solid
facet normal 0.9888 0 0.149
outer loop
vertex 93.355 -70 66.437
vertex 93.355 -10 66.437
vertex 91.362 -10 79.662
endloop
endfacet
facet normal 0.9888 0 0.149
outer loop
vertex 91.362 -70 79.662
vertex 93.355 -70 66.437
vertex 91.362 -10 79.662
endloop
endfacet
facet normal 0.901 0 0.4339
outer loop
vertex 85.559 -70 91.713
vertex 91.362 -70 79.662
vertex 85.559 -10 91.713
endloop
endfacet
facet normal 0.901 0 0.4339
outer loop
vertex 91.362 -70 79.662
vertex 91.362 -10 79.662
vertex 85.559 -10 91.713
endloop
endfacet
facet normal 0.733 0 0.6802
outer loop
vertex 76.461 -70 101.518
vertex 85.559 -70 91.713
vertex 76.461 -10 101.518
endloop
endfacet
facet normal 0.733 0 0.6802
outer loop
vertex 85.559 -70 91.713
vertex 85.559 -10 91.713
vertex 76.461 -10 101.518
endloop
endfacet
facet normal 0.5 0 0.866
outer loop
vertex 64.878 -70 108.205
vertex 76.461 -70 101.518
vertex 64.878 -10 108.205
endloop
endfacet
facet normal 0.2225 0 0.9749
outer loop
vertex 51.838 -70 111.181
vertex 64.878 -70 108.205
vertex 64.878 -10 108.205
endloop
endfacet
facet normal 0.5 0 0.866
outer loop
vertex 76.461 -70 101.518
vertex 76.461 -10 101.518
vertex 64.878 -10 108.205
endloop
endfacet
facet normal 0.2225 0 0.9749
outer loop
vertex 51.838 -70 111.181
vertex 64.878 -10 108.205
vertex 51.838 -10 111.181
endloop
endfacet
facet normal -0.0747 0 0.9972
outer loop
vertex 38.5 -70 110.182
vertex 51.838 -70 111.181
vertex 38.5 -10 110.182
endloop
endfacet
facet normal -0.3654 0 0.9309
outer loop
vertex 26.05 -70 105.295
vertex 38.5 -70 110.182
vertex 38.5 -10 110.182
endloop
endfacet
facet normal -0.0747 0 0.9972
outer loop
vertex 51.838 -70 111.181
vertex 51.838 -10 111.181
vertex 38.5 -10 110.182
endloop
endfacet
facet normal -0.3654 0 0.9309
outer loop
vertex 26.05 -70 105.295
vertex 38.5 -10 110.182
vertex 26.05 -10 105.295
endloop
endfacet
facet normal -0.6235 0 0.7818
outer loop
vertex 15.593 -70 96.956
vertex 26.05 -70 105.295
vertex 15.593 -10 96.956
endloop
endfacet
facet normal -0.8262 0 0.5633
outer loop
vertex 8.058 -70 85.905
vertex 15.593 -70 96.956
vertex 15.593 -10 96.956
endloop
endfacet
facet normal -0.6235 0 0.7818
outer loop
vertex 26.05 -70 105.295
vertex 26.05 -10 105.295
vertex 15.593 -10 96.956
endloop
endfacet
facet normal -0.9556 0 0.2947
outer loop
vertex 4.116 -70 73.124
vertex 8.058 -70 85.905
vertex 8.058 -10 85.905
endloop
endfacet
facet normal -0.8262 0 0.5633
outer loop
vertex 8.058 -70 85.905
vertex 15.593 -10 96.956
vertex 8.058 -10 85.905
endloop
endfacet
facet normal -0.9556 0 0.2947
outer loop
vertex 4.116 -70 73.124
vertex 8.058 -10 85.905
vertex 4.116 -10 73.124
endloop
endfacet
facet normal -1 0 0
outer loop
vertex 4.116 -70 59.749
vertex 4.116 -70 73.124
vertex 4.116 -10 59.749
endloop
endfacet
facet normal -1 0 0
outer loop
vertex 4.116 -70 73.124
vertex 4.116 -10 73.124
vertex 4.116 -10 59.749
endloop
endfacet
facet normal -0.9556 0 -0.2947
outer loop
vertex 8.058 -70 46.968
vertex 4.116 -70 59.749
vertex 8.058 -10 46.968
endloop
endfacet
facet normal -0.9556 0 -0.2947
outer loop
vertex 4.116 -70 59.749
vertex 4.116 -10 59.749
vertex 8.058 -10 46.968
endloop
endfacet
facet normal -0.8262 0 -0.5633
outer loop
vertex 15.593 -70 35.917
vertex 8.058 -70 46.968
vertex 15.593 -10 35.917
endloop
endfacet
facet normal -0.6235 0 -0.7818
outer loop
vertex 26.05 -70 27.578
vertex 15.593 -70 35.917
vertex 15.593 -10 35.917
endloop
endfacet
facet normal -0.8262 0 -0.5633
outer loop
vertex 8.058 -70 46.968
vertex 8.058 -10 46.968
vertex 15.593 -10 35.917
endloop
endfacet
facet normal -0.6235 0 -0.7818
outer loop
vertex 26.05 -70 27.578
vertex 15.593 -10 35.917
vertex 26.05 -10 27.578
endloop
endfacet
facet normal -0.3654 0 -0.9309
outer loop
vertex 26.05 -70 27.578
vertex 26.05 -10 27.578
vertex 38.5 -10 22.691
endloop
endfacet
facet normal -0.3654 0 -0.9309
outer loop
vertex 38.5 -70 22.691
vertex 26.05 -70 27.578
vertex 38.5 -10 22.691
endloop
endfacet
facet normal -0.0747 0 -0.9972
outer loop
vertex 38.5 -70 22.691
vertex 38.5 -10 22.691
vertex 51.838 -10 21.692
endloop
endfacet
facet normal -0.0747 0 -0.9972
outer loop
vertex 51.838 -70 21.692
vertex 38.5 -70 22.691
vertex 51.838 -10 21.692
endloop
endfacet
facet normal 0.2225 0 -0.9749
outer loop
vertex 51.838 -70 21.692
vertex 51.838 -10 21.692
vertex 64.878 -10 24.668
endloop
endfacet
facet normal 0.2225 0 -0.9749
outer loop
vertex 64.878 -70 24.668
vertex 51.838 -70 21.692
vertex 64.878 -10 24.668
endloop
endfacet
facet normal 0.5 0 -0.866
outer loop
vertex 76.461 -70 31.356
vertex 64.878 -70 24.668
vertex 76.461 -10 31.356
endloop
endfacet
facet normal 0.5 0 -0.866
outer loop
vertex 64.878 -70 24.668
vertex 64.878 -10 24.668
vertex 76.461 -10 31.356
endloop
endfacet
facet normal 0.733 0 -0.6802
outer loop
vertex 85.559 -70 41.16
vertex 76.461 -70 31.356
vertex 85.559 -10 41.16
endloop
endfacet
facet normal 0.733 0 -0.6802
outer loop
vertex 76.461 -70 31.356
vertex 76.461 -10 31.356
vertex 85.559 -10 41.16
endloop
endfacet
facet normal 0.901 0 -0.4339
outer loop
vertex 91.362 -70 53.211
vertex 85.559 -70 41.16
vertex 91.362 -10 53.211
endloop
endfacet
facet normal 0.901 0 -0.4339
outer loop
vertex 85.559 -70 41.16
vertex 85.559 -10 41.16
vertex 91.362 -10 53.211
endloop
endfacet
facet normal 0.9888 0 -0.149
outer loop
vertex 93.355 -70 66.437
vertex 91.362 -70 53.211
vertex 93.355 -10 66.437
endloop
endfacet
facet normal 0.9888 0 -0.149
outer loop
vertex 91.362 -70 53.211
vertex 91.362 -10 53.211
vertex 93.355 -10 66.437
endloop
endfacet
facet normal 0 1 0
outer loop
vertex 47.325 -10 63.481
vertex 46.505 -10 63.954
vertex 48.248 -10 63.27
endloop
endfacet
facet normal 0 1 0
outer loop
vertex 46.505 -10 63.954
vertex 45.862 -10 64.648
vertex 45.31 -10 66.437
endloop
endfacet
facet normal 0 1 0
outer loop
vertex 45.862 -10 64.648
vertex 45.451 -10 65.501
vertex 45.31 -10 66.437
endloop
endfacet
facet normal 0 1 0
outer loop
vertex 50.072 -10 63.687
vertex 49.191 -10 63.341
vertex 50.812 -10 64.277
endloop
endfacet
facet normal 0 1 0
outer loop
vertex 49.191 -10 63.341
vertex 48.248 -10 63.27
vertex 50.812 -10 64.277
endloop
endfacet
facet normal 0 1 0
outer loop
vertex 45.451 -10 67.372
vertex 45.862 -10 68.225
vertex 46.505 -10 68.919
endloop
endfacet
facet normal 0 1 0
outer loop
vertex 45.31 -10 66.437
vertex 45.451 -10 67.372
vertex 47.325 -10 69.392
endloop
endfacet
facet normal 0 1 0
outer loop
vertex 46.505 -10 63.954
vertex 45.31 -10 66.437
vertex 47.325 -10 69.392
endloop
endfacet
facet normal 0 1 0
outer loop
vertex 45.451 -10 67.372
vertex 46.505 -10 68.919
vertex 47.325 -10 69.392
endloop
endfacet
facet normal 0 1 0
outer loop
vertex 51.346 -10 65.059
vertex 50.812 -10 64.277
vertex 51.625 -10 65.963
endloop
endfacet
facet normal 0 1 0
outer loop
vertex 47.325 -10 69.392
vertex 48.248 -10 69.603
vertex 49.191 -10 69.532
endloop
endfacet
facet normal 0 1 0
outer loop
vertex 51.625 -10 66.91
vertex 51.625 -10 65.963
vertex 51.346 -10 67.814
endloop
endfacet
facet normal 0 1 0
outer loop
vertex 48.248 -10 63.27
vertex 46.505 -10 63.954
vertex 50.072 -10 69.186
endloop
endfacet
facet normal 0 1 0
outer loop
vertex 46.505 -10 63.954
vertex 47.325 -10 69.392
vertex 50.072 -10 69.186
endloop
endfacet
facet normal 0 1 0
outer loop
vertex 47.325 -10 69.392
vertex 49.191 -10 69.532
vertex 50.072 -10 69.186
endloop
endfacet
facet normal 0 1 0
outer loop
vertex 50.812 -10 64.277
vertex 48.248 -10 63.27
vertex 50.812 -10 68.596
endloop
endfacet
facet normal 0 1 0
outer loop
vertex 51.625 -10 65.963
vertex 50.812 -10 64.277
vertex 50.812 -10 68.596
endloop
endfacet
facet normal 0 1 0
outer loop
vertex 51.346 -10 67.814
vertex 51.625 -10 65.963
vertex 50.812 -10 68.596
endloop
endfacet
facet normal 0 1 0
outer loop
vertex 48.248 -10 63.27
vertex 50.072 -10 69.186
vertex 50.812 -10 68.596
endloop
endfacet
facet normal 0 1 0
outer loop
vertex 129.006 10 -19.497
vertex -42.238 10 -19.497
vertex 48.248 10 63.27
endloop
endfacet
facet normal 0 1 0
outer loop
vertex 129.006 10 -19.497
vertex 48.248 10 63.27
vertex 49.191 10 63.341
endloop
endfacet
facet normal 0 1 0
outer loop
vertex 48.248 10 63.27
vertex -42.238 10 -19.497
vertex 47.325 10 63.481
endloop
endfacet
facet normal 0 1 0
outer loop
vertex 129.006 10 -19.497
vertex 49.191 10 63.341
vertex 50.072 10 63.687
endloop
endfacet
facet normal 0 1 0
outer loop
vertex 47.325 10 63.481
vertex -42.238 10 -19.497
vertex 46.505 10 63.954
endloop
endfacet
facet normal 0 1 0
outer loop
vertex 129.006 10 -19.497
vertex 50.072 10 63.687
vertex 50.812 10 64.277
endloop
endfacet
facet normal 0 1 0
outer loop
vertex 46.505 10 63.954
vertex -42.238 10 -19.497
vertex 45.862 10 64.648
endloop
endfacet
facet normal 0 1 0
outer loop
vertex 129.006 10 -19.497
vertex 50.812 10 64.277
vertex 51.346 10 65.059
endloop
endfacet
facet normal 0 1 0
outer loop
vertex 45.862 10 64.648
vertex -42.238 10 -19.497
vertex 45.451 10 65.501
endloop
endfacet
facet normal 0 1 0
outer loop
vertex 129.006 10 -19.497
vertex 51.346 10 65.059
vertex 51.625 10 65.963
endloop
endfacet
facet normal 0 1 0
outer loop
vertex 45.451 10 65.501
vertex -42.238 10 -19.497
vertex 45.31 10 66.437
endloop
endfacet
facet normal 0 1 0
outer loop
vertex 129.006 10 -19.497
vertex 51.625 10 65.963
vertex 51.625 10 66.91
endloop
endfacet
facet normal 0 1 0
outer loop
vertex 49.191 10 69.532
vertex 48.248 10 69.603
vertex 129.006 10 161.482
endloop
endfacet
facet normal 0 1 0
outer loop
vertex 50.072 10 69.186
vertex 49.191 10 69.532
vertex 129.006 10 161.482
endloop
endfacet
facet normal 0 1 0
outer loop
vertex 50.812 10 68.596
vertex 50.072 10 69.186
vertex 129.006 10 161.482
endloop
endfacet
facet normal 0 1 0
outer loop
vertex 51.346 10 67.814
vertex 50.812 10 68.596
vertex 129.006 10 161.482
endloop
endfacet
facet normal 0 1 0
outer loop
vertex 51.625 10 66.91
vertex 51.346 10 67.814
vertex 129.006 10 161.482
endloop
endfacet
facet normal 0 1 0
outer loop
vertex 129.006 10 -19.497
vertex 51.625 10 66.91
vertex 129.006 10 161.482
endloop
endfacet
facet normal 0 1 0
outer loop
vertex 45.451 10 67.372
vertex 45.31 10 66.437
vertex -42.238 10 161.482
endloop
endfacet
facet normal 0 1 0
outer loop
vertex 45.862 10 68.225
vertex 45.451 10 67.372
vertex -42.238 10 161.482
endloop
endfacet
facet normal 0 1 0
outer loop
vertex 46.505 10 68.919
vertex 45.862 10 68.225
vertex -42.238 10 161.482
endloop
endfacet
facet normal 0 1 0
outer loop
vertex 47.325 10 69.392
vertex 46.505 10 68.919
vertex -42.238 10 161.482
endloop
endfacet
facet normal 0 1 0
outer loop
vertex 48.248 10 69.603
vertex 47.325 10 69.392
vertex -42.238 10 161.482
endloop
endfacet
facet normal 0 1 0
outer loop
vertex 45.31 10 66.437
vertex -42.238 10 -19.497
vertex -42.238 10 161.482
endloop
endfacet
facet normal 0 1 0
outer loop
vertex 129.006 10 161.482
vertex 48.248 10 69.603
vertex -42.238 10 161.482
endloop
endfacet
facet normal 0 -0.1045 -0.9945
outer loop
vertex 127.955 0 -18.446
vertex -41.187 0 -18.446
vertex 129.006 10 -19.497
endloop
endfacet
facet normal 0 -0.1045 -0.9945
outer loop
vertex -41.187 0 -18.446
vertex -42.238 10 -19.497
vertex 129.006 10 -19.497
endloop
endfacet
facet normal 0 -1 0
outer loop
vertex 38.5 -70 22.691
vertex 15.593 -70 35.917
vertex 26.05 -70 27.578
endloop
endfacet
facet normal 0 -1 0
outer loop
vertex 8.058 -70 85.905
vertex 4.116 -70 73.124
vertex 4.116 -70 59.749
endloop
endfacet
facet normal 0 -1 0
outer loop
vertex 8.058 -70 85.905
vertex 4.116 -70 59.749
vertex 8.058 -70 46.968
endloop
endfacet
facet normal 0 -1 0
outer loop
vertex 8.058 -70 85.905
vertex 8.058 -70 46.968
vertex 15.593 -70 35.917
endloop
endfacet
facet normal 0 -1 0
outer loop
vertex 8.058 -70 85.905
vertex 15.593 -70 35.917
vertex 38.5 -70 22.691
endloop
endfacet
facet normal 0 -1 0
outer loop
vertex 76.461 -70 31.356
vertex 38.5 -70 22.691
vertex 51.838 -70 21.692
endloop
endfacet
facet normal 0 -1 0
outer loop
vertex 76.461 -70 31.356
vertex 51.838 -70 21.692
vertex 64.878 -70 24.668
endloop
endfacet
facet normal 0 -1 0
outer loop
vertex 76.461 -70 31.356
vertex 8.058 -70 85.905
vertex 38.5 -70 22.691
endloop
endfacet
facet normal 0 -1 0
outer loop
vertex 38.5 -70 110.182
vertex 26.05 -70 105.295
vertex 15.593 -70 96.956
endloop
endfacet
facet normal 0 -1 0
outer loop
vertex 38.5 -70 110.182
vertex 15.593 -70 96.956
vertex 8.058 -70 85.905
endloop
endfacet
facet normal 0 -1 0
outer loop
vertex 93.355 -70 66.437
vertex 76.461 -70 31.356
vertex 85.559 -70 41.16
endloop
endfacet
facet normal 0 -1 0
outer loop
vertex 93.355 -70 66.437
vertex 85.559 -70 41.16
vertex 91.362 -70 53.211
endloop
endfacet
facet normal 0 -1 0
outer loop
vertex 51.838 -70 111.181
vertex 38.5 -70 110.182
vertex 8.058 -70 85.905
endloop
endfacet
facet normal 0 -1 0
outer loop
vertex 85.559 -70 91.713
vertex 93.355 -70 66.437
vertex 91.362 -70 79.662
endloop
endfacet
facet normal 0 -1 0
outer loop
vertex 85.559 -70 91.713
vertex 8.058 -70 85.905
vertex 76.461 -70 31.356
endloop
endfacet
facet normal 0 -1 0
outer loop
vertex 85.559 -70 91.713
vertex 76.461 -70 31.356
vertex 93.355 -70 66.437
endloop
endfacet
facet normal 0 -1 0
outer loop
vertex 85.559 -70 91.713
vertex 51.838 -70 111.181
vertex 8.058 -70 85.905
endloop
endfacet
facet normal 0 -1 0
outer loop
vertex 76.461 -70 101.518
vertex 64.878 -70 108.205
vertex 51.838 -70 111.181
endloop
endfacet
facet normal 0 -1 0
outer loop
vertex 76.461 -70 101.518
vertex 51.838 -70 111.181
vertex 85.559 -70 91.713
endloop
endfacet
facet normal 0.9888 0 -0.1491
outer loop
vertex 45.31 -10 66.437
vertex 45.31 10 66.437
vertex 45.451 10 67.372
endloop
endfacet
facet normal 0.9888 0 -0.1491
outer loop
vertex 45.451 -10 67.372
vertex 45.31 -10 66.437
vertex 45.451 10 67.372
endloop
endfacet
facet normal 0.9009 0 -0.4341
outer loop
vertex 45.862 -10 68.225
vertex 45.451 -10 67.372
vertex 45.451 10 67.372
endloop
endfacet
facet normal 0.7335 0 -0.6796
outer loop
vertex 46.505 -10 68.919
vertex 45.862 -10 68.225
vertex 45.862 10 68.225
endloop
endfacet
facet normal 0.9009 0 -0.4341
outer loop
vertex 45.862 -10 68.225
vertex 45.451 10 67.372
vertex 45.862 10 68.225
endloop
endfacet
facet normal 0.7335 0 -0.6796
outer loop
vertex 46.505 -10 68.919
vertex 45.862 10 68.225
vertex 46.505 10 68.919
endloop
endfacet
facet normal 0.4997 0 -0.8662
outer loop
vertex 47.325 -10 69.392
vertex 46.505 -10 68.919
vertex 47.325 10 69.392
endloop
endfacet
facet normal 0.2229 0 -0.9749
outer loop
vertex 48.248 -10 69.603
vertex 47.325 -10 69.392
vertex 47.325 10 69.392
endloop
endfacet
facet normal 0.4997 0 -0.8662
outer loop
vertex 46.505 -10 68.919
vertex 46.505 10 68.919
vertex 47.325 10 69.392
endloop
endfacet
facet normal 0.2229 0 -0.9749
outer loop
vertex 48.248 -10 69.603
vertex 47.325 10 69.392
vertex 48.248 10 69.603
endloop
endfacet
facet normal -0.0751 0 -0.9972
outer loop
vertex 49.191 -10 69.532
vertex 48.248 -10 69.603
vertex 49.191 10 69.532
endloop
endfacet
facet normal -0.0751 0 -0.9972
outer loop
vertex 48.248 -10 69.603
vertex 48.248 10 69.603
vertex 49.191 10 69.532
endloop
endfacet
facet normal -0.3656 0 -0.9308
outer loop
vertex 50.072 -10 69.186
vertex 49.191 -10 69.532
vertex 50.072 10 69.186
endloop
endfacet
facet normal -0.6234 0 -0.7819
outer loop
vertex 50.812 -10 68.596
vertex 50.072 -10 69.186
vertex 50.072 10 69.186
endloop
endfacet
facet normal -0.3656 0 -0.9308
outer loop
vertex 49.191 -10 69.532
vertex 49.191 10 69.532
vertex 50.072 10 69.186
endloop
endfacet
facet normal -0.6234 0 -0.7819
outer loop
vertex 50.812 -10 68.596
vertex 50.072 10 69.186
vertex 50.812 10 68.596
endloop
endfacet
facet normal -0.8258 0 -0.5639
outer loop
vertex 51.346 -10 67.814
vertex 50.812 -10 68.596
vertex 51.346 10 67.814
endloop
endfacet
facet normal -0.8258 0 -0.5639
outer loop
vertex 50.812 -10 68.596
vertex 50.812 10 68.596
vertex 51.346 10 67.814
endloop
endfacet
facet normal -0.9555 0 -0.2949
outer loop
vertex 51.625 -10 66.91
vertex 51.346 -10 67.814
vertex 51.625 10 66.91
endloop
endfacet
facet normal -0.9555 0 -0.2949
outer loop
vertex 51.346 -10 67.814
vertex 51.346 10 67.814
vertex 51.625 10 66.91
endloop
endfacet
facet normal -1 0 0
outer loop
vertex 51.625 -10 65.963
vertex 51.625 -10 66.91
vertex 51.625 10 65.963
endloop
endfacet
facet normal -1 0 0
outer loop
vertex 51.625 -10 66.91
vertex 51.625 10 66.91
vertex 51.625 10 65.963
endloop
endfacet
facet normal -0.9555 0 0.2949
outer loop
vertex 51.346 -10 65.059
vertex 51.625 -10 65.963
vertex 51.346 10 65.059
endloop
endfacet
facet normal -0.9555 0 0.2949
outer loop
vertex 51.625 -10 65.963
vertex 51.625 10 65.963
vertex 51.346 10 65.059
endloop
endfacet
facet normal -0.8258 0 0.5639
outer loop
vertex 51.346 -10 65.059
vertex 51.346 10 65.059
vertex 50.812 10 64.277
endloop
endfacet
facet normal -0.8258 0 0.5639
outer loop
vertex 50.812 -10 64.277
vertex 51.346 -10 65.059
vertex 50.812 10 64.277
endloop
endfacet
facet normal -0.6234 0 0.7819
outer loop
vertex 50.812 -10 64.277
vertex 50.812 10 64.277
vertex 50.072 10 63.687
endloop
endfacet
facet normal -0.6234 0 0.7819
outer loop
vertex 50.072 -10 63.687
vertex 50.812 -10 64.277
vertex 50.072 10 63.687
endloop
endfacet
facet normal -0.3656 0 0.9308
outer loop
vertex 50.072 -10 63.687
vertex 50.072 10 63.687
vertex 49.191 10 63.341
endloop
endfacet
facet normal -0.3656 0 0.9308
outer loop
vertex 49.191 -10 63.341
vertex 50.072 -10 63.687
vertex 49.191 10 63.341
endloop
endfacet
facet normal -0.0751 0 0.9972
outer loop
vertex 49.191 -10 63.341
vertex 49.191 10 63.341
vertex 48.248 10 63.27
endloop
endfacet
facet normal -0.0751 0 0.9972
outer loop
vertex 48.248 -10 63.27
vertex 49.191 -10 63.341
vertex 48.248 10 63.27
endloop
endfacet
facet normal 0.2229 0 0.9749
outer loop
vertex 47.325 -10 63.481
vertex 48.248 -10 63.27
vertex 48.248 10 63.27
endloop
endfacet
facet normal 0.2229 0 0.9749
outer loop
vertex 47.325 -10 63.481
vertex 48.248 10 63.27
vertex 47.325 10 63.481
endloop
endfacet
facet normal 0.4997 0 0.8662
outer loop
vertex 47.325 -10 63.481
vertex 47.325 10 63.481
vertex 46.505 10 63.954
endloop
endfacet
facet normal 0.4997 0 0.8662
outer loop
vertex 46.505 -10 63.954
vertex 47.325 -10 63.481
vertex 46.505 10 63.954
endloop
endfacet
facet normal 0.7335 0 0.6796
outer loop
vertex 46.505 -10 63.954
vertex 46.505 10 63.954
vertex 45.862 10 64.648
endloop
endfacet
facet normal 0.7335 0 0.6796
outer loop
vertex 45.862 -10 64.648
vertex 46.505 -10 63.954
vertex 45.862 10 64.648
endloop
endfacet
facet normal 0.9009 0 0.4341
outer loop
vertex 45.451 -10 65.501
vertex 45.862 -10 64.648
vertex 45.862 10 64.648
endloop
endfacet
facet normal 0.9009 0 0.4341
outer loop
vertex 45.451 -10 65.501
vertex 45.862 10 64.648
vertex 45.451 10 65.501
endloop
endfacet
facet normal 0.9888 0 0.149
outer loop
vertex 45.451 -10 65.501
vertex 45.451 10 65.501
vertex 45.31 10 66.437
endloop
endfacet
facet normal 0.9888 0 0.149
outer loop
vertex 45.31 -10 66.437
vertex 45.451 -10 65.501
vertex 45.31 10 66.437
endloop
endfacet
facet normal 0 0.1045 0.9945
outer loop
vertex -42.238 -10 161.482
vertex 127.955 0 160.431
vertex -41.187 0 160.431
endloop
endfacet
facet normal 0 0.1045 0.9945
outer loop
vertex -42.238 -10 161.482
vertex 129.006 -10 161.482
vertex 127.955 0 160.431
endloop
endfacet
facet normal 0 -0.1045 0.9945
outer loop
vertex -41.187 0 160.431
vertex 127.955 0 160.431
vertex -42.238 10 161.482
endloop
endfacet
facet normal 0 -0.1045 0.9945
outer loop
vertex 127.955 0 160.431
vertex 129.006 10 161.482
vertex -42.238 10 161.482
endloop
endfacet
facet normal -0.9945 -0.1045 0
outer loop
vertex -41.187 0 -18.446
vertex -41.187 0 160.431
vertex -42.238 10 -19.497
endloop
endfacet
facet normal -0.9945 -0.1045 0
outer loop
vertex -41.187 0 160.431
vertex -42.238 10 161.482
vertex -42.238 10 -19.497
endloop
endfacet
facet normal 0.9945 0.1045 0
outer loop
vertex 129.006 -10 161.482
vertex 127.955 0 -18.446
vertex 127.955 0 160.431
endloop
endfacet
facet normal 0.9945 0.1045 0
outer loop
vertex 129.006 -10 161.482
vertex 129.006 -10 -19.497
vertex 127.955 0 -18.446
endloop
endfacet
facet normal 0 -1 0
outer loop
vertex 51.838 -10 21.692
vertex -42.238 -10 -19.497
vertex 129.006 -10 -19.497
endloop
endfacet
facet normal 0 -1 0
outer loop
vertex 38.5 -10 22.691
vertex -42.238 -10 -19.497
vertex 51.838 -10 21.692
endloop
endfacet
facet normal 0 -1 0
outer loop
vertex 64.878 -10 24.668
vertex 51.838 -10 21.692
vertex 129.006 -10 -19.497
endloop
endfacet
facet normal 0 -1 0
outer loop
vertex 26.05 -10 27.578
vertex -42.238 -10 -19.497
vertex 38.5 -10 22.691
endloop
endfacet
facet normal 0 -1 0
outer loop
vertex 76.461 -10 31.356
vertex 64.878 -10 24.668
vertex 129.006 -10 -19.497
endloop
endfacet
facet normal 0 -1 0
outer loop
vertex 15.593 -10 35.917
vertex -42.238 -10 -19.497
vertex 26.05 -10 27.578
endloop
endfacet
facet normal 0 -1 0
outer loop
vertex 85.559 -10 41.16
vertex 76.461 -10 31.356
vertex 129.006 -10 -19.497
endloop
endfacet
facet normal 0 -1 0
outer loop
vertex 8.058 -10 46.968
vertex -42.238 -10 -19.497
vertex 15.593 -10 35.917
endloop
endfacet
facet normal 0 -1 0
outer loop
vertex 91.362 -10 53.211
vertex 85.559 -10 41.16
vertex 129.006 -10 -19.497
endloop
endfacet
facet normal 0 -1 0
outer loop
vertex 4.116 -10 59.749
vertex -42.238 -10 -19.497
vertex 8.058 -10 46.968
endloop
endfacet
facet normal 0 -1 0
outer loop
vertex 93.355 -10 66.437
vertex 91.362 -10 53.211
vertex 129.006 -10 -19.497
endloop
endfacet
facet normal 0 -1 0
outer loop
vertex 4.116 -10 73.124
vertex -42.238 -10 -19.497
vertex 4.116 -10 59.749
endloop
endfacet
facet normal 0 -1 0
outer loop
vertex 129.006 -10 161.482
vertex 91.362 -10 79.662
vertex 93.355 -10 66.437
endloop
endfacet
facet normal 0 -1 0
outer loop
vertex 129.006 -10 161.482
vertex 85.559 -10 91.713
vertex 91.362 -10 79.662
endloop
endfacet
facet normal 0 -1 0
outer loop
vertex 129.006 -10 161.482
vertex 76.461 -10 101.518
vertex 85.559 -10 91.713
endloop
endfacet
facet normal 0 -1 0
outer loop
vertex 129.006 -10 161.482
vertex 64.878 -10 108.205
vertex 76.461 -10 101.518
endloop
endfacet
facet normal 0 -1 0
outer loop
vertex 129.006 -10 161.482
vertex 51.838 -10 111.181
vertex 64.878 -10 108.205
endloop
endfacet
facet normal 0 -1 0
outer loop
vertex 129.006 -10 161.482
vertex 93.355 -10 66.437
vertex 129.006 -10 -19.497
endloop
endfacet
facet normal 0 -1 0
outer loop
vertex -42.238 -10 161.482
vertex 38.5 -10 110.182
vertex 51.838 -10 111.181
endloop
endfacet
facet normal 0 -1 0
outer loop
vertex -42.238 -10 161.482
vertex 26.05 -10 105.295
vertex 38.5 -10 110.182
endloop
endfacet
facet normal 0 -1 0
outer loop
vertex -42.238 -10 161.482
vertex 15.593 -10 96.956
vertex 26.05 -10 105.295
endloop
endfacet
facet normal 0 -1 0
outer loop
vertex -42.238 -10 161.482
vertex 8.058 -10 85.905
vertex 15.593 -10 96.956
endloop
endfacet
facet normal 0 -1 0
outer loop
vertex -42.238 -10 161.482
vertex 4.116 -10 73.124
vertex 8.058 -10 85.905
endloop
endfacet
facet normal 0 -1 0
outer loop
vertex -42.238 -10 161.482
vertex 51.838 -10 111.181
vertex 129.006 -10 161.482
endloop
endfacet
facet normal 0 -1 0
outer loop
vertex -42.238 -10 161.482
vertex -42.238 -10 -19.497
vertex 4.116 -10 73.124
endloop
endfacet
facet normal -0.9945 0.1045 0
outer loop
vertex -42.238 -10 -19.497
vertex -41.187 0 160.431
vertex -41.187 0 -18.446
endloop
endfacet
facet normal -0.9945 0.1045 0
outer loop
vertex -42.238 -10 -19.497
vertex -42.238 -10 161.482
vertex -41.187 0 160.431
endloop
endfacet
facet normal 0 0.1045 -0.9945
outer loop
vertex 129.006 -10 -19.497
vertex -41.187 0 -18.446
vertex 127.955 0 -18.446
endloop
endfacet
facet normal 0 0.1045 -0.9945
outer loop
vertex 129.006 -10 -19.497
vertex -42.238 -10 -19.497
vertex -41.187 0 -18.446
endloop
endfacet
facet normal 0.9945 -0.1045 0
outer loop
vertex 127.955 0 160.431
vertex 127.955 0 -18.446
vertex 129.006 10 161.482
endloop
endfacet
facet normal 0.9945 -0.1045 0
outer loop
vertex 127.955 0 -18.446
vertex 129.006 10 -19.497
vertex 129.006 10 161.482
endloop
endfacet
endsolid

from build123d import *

# Parameters (mm, degrees)
F0_W     = 169.1423505545
F0_H     = 178.8771897554
F1_DEPTH = 10
F1_TAPER = -6
F3_D     = 6.35
F4_R     = 44.8702969829
F5_DEPTH = 60


with BuildPart() as f1:
    # F0 (on Front) → F1 (new body, symmetric)
    with BuildSketch(Plane.XZ):
        with Locations((43.3839261532, 70.992641151)):
            Rectangle(F0_W, F0_H)
    extrude(amount=F1_DEPTH, both=True, taper=F1_TAPER)

    # F3 (through all)
    with Locations(Plane.XZ.offset(10)):
        with Locations((48.48498106, 66.4365887642)):
            Hole(F3_D / 2)

    # F4 (on face) → F5 (join)
    with BuildSketch(Plane.XZ.offset(10)):
        with Locations((48.48498106, 66.4365887642)):
            Circle(F4_R)
    extrude(amount=F5_DEPTH)


solid = f1.part
